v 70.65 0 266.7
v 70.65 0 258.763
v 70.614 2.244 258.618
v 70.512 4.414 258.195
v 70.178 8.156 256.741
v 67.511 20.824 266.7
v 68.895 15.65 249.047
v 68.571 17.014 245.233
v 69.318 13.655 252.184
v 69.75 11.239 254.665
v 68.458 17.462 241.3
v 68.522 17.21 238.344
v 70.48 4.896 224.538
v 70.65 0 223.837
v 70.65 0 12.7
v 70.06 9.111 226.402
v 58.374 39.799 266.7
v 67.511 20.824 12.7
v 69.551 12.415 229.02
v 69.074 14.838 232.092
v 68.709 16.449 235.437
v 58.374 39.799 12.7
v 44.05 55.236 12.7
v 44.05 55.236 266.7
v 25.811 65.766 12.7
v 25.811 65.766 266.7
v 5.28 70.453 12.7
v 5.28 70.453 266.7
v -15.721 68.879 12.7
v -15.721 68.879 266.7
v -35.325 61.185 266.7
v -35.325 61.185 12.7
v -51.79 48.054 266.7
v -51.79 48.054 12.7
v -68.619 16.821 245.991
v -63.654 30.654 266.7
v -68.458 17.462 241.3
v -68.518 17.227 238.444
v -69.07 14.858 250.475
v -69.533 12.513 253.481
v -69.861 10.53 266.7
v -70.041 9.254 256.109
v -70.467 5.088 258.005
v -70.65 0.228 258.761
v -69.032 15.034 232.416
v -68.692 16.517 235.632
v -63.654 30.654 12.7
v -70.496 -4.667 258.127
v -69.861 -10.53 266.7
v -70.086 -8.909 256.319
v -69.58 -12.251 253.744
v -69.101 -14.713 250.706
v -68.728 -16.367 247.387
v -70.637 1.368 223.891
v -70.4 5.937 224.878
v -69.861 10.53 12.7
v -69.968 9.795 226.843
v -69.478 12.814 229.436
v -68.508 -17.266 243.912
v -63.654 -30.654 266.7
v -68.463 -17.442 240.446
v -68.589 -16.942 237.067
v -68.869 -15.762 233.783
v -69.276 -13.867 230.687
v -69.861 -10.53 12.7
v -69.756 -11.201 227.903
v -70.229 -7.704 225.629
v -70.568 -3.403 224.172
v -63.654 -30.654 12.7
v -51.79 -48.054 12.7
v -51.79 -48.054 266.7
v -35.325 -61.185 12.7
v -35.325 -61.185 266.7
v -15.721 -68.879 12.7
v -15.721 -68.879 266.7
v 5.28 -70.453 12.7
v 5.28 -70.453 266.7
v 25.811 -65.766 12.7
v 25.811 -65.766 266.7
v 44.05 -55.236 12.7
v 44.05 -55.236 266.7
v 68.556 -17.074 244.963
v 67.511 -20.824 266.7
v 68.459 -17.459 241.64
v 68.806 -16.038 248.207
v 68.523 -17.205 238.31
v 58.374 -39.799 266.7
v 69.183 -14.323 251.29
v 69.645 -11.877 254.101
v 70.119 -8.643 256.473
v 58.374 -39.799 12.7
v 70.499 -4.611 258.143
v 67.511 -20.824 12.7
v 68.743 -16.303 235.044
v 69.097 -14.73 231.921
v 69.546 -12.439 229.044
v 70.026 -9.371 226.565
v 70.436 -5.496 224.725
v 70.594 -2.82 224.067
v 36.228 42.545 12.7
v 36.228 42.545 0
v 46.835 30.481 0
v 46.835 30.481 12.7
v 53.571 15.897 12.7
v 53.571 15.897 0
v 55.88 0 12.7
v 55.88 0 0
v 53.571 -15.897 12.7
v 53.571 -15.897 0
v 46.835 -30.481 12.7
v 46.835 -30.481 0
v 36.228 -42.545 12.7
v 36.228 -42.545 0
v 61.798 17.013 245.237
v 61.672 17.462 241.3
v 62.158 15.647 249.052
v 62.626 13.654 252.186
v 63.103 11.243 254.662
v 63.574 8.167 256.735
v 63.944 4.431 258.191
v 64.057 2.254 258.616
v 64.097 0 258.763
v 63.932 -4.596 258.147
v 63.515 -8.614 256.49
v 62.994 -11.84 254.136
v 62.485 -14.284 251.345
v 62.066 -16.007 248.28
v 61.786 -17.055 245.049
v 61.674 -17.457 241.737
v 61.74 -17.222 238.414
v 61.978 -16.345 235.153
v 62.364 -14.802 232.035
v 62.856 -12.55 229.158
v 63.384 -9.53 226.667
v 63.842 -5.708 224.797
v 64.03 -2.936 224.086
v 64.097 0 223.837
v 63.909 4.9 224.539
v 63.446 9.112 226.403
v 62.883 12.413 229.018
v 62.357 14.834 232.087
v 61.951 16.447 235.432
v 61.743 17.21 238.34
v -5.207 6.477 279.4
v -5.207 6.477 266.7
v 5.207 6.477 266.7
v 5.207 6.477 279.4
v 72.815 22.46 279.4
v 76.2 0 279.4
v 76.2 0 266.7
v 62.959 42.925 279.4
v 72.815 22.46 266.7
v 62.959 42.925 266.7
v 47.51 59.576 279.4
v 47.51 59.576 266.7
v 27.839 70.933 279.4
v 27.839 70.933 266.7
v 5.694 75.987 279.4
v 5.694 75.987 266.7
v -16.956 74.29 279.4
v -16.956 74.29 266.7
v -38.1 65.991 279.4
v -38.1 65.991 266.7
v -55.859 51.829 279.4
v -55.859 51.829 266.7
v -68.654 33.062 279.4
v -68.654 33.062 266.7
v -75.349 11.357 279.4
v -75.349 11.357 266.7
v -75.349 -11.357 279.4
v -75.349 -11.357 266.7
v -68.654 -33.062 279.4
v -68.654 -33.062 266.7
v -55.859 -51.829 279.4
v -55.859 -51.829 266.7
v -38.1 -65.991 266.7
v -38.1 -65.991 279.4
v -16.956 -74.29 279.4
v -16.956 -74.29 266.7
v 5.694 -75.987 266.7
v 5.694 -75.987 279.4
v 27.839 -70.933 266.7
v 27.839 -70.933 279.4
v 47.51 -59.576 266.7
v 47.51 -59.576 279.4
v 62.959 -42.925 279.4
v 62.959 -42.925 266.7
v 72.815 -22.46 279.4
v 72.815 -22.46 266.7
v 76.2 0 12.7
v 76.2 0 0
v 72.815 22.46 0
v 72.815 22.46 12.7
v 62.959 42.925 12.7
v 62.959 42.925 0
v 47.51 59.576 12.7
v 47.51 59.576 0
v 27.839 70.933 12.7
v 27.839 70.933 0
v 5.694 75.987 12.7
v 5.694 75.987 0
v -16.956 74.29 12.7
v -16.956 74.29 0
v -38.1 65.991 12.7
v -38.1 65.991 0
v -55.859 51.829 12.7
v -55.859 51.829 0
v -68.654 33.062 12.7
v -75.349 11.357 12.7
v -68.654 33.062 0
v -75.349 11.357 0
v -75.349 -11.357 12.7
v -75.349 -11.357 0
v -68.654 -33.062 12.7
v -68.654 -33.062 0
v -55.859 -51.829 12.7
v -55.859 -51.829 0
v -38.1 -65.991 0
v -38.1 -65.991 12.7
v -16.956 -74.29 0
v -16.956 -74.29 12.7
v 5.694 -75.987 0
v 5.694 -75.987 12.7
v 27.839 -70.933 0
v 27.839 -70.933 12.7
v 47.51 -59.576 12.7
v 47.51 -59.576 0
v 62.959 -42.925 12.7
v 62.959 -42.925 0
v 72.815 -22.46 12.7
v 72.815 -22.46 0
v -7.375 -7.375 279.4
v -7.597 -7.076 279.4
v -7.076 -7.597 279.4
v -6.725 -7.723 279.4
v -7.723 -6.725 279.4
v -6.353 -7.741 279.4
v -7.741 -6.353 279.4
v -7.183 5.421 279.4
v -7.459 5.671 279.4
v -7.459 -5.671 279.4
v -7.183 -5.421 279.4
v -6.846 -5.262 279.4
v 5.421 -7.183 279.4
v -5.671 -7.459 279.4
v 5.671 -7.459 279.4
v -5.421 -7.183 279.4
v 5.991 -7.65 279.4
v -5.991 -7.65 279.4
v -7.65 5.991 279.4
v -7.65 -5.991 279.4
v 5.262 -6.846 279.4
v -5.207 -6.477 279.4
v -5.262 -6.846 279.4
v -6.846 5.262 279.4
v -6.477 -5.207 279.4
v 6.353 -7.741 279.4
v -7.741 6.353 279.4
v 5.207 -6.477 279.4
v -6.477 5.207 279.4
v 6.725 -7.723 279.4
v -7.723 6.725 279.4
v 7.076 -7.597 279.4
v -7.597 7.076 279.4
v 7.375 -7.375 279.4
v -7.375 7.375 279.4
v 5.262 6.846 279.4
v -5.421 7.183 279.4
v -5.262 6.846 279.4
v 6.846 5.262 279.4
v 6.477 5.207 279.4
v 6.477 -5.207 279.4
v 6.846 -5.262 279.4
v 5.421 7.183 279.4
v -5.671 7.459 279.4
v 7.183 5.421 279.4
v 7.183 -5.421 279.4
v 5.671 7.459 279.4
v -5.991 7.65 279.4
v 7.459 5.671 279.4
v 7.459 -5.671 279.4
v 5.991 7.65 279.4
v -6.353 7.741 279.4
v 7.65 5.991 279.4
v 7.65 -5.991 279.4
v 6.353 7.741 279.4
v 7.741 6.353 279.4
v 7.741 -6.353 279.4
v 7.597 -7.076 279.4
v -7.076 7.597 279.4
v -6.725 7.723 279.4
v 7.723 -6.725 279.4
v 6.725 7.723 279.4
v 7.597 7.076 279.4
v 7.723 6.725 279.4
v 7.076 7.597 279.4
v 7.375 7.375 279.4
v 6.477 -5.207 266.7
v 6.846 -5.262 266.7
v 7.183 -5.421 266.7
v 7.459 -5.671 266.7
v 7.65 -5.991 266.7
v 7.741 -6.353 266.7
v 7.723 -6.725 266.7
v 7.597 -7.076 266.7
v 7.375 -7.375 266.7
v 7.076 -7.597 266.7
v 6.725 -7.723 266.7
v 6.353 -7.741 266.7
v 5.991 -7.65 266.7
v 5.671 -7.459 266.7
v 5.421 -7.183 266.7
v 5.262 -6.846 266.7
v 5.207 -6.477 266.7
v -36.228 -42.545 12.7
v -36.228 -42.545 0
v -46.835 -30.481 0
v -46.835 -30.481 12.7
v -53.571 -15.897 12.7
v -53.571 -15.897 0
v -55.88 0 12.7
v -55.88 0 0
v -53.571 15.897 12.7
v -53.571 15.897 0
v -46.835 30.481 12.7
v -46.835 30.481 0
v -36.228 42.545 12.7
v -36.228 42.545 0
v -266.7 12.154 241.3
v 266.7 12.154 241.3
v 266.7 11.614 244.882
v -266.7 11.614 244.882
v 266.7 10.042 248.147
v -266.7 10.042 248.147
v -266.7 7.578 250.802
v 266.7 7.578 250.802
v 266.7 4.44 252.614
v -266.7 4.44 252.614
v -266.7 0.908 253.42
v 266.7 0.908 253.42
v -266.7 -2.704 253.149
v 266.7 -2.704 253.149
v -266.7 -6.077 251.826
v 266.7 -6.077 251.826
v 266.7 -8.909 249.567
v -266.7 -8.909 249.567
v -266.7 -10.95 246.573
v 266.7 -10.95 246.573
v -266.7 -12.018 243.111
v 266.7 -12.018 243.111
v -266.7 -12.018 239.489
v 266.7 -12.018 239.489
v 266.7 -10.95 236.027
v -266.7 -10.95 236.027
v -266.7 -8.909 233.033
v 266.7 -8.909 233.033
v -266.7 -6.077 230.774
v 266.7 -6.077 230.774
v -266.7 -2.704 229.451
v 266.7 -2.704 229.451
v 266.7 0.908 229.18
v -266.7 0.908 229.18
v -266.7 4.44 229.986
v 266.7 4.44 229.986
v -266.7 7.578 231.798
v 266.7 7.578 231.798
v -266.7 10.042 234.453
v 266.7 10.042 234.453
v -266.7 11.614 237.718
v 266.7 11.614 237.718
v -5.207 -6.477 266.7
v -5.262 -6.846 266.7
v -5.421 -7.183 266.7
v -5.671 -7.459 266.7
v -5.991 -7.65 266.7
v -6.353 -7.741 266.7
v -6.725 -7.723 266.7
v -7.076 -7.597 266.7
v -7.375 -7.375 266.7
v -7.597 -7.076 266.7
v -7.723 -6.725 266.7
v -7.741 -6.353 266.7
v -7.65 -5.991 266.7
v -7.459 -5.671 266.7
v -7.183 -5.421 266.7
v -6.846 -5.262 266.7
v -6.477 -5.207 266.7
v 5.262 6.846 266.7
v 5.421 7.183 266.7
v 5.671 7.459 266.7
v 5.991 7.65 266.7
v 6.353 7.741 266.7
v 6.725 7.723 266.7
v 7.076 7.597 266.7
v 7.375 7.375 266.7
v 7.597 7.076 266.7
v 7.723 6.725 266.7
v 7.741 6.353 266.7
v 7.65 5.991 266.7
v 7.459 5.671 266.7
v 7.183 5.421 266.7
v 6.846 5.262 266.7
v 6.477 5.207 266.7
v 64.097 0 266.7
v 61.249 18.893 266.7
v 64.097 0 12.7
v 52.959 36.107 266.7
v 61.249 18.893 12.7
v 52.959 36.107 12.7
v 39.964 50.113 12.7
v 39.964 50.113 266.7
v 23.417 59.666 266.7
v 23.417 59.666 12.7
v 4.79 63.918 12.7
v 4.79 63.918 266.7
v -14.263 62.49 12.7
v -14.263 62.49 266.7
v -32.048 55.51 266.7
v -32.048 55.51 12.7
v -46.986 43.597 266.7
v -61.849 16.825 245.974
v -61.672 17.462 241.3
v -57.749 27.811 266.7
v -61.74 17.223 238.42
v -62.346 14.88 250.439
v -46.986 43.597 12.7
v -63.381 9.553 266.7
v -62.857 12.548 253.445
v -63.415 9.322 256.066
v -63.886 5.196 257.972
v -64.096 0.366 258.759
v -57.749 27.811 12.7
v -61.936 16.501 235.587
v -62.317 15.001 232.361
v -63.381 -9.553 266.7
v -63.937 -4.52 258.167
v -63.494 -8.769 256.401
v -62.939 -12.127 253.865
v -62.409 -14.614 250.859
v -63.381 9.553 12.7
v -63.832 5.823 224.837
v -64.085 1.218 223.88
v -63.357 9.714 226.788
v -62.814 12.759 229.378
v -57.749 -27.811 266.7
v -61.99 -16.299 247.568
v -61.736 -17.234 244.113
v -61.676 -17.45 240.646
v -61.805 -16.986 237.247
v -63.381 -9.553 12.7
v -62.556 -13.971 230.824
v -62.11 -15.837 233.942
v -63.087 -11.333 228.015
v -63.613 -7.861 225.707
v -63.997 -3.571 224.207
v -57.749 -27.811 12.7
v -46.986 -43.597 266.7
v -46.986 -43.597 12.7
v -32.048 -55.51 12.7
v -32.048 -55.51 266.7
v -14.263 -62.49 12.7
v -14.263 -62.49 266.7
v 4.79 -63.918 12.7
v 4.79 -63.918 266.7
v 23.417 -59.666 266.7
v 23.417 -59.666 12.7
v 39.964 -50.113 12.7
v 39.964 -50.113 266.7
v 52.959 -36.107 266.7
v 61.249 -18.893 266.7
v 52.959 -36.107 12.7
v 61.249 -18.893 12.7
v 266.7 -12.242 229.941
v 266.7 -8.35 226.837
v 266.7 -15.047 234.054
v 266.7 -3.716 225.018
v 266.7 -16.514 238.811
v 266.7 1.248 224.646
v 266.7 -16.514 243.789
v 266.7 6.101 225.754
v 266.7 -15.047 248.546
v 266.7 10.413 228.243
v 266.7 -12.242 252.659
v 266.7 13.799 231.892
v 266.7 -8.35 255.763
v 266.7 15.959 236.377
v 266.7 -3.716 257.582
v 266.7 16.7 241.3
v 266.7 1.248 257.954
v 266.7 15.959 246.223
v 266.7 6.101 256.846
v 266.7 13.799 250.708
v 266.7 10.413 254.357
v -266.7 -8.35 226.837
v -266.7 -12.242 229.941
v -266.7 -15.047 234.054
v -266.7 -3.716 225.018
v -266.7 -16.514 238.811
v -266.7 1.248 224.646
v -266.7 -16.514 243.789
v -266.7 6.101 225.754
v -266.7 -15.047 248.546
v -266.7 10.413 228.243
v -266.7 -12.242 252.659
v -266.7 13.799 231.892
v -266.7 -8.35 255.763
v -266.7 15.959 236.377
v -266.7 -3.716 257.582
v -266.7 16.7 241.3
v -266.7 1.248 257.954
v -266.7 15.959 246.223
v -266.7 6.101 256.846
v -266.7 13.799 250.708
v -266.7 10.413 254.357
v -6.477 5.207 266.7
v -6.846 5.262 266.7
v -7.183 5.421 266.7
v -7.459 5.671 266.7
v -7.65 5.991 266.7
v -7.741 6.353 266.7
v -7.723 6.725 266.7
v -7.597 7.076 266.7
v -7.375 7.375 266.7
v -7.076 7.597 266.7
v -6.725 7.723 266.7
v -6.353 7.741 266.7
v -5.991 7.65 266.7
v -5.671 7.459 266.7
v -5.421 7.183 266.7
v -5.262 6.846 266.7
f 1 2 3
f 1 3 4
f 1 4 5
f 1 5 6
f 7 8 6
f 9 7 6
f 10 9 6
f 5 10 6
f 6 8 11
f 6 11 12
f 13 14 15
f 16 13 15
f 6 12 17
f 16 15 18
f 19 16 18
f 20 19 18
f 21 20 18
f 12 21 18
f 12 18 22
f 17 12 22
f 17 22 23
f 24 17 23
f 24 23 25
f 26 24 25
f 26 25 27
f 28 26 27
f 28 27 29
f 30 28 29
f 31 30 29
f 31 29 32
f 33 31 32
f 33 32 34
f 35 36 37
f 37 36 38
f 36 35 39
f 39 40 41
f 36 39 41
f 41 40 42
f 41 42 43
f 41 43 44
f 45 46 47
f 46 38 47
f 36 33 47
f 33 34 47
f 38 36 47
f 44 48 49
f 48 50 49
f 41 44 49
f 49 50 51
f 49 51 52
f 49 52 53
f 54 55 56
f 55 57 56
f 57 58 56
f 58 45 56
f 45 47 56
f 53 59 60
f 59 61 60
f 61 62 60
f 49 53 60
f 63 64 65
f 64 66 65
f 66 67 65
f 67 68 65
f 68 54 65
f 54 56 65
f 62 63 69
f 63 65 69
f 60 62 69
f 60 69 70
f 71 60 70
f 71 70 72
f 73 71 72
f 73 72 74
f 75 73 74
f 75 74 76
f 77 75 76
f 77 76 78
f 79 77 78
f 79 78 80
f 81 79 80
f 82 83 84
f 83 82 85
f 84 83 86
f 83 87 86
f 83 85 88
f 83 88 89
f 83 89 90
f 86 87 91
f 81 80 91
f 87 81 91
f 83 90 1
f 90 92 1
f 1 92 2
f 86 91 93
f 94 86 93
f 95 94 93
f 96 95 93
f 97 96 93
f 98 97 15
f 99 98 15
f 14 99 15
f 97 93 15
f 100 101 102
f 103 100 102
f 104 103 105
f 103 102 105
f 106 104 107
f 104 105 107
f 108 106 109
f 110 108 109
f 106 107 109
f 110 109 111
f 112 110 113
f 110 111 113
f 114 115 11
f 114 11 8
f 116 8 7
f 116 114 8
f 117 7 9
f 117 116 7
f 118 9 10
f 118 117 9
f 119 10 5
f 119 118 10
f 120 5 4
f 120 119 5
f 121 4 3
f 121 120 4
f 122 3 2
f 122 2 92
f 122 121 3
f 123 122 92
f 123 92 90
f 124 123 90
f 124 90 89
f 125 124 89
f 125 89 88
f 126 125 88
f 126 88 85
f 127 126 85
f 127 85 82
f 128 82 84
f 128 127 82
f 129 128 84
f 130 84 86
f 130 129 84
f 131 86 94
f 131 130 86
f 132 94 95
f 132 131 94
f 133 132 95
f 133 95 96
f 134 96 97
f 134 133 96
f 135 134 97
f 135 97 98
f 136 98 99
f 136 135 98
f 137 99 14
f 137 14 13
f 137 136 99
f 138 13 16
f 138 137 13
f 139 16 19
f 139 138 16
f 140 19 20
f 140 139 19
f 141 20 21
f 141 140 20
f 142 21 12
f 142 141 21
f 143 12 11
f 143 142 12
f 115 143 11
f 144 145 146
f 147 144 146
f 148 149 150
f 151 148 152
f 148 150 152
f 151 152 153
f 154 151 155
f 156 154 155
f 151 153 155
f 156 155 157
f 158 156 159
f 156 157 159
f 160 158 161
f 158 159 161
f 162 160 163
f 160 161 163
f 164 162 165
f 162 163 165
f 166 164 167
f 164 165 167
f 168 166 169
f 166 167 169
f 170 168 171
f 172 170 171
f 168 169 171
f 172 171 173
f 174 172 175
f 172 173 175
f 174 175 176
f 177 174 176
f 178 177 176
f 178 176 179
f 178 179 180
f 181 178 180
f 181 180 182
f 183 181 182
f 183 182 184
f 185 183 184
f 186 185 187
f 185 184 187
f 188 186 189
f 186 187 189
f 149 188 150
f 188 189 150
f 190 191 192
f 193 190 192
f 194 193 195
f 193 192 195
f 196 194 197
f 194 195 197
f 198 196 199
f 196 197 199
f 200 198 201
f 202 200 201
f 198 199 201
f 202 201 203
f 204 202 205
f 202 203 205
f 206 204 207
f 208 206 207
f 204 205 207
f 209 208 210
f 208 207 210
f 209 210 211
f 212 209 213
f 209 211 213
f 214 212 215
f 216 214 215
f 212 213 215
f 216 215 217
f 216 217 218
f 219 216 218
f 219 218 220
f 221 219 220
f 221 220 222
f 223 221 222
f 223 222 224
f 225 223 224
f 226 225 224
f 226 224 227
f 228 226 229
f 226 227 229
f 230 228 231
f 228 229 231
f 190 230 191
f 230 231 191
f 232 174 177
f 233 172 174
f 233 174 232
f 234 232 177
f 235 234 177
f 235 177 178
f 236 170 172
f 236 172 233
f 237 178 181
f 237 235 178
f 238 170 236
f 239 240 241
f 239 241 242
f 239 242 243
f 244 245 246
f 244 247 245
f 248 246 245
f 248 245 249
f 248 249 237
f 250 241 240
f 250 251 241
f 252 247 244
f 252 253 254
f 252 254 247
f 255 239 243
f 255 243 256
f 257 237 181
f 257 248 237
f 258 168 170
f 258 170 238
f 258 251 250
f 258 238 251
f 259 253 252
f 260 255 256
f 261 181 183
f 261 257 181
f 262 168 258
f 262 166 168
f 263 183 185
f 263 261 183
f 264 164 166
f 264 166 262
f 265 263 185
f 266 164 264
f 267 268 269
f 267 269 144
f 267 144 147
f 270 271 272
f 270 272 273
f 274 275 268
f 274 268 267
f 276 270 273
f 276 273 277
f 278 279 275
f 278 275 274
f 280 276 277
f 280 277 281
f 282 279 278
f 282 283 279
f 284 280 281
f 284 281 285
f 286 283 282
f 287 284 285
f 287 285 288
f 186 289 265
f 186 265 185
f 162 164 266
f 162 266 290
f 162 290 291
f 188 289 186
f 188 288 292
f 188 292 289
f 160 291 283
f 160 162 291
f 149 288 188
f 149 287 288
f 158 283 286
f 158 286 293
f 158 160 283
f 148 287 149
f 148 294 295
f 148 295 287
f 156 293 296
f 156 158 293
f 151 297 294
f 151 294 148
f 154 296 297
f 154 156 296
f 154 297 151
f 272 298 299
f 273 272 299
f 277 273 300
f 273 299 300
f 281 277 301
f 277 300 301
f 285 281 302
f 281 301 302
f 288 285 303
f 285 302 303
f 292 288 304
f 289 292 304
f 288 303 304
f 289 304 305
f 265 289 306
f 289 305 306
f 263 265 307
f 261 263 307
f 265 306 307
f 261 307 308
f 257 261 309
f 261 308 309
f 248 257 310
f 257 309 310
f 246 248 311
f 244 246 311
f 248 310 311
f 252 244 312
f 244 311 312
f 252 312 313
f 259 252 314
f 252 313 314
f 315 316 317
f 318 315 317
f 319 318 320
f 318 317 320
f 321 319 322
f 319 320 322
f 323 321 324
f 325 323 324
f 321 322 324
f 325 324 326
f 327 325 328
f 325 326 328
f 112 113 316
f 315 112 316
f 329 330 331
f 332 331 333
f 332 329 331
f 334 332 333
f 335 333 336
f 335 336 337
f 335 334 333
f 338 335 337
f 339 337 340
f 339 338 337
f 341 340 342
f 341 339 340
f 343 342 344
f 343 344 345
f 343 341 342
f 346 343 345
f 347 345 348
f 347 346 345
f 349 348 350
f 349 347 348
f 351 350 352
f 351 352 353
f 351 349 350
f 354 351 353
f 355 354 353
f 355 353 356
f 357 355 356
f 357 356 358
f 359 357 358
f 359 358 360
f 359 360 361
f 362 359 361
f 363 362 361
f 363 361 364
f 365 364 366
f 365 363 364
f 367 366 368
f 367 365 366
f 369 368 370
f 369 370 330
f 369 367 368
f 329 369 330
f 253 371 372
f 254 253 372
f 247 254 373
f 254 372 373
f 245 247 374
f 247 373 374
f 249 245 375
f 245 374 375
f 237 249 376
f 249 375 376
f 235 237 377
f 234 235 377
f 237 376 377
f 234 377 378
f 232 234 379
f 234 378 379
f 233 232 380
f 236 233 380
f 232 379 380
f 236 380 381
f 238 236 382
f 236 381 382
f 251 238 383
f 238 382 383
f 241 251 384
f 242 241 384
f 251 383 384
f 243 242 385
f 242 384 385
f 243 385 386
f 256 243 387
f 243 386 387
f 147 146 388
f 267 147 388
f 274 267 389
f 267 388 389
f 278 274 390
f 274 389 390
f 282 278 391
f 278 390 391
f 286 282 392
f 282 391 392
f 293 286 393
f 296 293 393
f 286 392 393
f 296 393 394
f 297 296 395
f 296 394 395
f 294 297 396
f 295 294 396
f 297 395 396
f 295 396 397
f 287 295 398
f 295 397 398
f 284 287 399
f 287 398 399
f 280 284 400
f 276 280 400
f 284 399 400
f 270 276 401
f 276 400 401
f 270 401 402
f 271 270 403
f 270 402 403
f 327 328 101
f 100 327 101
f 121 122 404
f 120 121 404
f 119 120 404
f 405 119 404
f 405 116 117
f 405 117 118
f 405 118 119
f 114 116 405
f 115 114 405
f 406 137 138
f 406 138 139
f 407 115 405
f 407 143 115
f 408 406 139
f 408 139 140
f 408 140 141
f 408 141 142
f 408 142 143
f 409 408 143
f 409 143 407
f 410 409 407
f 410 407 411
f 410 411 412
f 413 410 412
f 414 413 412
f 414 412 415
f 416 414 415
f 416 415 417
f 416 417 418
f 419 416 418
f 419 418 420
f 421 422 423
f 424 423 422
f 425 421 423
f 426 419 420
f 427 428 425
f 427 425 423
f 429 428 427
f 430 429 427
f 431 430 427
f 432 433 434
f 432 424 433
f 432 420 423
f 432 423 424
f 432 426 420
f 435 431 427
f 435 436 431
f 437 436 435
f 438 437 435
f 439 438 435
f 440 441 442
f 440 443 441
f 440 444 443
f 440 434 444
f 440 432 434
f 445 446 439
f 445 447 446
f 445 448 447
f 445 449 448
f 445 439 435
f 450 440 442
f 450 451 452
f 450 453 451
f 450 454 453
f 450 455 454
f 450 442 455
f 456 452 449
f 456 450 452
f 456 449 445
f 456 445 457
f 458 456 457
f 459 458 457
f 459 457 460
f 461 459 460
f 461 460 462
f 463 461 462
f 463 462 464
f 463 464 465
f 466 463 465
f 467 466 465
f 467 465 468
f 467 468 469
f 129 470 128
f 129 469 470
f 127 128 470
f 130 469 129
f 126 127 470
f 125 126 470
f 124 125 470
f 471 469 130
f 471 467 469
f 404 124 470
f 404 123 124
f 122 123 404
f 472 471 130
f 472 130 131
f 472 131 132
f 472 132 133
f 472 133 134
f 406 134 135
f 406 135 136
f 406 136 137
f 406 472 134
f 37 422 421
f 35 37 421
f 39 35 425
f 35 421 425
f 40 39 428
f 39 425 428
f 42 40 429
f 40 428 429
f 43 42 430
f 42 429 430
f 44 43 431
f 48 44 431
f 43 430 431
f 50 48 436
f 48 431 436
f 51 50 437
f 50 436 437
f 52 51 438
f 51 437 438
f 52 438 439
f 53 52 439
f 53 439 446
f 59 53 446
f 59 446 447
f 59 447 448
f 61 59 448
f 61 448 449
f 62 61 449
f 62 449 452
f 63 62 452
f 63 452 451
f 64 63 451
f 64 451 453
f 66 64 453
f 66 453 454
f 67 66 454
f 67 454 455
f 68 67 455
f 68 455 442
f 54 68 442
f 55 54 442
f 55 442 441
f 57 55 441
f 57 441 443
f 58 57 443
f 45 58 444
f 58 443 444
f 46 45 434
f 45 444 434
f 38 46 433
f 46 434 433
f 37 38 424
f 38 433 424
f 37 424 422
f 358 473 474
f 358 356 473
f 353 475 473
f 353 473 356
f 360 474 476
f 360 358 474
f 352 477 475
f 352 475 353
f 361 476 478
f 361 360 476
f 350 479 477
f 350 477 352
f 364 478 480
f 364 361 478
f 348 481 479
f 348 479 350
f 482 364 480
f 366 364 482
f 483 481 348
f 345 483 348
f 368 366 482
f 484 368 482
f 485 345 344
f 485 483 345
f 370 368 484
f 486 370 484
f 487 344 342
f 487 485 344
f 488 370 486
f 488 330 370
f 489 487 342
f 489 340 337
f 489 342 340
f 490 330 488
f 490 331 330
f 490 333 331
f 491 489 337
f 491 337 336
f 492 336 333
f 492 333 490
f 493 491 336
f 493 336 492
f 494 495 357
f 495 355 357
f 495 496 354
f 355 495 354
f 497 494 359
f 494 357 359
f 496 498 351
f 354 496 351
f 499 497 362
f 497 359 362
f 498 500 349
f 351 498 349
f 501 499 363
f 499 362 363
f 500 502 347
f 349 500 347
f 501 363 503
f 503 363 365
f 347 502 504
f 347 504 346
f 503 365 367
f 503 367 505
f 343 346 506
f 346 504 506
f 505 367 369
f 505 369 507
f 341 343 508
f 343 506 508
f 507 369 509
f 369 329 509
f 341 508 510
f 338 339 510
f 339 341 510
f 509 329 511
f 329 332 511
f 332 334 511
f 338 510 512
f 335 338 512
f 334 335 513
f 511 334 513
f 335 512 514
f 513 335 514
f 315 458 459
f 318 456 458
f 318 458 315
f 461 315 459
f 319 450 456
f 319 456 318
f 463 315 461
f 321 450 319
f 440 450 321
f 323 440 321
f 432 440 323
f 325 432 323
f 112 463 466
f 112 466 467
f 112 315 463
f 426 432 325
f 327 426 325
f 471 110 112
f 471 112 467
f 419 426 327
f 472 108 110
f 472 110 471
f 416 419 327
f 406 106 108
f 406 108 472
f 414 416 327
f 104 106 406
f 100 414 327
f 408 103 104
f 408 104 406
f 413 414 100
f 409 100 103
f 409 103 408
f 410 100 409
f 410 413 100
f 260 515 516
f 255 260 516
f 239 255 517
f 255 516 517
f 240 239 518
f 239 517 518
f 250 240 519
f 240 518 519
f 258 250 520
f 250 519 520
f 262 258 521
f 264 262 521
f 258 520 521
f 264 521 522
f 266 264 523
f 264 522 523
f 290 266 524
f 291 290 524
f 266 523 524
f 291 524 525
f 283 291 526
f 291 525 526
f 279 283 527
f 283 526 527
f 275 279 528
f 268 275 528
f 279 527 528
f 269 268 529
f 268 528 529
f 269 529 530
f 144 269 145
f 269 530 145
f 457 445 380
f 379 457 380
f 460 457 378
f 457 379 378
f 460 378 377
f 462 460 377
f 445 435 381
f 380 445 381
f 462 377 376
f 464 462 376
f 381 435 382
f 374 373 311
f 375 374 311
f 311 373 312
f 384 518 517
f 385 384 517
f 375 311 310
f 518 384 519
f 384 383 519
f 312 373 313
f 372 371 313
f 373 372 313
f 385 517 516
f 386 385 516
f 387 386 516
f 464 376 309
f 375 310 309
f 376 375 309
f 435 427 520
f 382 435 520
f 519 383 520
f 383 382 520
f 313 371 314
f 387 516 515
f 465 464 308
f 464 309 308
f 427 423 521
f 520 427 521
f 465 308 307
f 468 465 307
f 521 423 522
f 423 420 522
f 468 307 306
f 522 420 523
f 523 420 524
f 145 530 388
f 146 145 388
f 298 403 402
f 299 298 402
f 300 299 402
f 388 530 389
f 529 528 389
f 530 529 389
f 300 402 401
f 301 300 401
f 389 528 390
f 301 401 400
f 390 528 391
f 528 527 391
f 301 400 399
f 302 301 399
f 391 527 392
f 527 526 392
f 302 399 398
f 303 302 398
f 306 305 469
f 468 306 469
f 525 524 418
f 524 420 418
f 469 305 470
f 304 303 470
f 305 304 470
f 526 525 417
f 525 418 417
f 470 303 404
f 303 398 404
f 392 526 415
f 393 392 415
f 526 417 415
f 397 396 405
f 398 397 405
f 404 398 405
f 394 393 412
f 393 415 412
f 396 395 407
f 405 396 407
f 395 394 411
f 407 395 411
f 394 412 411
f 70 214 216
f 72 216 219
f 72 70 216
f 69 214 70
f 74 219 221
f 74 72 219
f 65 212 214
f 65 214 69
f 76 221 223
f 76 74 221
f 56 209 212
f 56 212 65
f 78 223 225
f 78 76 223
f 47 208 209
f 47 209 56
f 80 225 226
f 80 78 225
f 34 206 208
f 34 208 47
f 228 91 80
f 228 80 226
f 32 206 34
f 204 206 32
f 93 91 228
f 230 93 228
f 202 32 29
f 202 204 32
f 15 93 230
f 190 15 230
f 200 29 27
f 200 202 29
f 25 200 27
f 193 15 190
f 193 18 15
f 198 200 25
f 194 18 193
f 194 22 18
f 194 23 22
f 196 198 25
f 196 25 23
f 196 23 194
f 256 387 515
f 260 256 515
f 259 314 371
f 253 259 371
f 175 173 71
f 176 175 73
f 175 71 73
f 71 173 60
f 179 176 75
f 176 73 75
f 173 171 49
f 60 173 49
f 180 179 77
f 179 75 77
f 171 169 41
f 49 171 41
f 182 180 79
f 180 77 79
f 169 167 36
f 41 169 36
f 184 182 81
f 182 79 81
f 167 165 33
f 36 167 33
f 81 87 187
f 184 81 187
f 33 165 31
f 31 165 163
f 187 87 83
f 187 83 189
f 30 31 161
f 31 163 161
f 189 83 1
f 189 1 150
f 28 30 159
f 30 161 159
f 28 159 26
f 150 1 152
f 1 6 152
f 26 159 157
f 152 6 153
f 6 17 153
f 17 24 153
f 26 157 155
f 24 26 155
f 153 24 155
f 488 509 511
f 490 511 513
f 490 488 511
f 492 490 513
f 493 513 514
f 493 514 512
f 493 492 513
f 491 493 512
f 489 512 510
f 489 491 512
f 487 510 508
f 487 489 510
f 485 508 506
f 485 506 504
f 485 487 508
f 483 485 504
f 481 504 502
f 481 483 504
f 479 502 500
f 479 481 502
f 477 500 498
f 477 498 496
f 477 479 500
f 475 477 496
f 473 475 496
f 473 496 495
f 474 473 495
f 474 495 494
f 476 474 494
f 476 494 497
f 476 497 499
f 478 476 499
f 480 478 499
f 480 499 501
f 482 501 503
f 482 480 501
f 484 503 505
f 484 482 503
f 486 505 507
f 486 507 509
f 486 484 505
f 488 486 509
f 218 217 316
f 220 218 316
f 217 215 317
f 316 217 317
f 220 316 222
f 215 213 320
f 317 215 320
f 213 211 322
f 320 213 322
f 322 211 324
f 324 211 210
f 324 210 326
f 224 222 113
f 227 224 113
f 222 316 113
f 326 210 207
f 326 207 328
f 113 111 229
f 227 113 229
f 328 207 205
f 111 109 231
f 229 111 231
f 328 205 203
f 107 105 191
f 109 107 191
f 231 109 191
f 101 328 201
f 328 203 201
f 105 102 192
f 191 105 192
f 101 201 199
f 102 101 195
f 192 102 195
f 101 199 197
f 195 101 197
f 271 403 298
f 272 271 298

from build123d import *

# Parameters (mm, degrees)
F0_R          = 76.2
F1_DEPTH      = 12.7
F2_R          = 70.6501
F2_R_2        = 64.0969
F3_DEPTH      = 254
F4_R          = 76.2
F5_DEPTH      = 12.7
F6_R          = 17.4625
F7_DEPTH      = 76.201
F7_DEPTH_BACK = 76.201
F8_R          = 16.7005
F8_R_2        = 12.1539
F9_DEPTH      = 266.7


with BuildPart() as f1:
    # F0 (on Top) → F1 (new body)
    with BuildSketch(Plane.XY):
        Circle(F0_R)
        with BuildLine():
            Line((-36.228405637, 42.545), (36.228405637, 42.545))
            ThreePointArc((36.228405637, 42.545), (55.88, 0), (36.228405637, -42.545))
            Line((36.228405637, -42.545), (-36.228405637, -42.545))
            ThreePointArc((-36.228405637, -42.545), (-55.88, 0), (-36.228405637, 42.545))
        make_face(mode=Mode.SUBTRACT)
    extrude(amount=F1_DEPTH)

    # F2 (on face) → F3 (join)
    with BuildSketch(Plane.XY.offset(12.7)):
        Circle(F2_R)
        Circle(F2_R_2, mode=Mode.SUBTRACT)
    extrude(amount=F3_DEPTH)

    # F4 (on face) → F5 (join)
    with BuildSketch(Plane.XY.offset(266.7)):
        Circle(F4_R)
        with BuildLine():
            Line((-5.207, 6.477), (5.207, 6.477))
            ThreePointArc((5.207, 6.477), (7.3750256121, 7.3750256121), (6.477, 5.207))
            Line((6.477, 5.207), (6.477, -5.207))
            ThreePointArc((6.477, -5.207), (7.3750256121, -7.3750256121), (5.207, -6.477))
            Line((5.207, -6.477), (-5.207, -6.477))
            ThreePointArc((-5.207, -6.477), (-7.3750256121, -7.3750256121), (-6.477, -5.207))
            Line((-6.477, -5.207), (-6.477, 5.207))
            ThreePointArc((-6.477, 5.207), (-7.3750256121, 7.3750256121), (-5.207, 6.477))
        make_face(mode=Mode.SUBTRACT)
    extrude(amount=F5_DEPTH)

    # F6 (on Right) → F7 (cut, two sides)
    with BuildSketch(Plane.YZ) as f7_sk:
        with Locations((0, 241.3)):
            Circle(F6_R)
    extrude(amount=-F7_DEPTH, mode=Mode.SUBTRACT)
    extrude(f7_sk.sketch, amount=F7_DEPTH_BACK, mode=Mode.SUBTRACT)


with BuildPart() as f9:
    # F8 (on Right) → F9 (new body, symmetric)
    with BuildSketch(Plane.YZ):
        with Locations((0, 241.3)):
            Circle(F8_R)
        with Locations((0, 241.3)):
            Circle(F8_R_2, mode=Mode.SUBTRACT)
    extrude(amount=F9_DEPTH, both=True)


solid = Compound([f1.part, f9.part])
